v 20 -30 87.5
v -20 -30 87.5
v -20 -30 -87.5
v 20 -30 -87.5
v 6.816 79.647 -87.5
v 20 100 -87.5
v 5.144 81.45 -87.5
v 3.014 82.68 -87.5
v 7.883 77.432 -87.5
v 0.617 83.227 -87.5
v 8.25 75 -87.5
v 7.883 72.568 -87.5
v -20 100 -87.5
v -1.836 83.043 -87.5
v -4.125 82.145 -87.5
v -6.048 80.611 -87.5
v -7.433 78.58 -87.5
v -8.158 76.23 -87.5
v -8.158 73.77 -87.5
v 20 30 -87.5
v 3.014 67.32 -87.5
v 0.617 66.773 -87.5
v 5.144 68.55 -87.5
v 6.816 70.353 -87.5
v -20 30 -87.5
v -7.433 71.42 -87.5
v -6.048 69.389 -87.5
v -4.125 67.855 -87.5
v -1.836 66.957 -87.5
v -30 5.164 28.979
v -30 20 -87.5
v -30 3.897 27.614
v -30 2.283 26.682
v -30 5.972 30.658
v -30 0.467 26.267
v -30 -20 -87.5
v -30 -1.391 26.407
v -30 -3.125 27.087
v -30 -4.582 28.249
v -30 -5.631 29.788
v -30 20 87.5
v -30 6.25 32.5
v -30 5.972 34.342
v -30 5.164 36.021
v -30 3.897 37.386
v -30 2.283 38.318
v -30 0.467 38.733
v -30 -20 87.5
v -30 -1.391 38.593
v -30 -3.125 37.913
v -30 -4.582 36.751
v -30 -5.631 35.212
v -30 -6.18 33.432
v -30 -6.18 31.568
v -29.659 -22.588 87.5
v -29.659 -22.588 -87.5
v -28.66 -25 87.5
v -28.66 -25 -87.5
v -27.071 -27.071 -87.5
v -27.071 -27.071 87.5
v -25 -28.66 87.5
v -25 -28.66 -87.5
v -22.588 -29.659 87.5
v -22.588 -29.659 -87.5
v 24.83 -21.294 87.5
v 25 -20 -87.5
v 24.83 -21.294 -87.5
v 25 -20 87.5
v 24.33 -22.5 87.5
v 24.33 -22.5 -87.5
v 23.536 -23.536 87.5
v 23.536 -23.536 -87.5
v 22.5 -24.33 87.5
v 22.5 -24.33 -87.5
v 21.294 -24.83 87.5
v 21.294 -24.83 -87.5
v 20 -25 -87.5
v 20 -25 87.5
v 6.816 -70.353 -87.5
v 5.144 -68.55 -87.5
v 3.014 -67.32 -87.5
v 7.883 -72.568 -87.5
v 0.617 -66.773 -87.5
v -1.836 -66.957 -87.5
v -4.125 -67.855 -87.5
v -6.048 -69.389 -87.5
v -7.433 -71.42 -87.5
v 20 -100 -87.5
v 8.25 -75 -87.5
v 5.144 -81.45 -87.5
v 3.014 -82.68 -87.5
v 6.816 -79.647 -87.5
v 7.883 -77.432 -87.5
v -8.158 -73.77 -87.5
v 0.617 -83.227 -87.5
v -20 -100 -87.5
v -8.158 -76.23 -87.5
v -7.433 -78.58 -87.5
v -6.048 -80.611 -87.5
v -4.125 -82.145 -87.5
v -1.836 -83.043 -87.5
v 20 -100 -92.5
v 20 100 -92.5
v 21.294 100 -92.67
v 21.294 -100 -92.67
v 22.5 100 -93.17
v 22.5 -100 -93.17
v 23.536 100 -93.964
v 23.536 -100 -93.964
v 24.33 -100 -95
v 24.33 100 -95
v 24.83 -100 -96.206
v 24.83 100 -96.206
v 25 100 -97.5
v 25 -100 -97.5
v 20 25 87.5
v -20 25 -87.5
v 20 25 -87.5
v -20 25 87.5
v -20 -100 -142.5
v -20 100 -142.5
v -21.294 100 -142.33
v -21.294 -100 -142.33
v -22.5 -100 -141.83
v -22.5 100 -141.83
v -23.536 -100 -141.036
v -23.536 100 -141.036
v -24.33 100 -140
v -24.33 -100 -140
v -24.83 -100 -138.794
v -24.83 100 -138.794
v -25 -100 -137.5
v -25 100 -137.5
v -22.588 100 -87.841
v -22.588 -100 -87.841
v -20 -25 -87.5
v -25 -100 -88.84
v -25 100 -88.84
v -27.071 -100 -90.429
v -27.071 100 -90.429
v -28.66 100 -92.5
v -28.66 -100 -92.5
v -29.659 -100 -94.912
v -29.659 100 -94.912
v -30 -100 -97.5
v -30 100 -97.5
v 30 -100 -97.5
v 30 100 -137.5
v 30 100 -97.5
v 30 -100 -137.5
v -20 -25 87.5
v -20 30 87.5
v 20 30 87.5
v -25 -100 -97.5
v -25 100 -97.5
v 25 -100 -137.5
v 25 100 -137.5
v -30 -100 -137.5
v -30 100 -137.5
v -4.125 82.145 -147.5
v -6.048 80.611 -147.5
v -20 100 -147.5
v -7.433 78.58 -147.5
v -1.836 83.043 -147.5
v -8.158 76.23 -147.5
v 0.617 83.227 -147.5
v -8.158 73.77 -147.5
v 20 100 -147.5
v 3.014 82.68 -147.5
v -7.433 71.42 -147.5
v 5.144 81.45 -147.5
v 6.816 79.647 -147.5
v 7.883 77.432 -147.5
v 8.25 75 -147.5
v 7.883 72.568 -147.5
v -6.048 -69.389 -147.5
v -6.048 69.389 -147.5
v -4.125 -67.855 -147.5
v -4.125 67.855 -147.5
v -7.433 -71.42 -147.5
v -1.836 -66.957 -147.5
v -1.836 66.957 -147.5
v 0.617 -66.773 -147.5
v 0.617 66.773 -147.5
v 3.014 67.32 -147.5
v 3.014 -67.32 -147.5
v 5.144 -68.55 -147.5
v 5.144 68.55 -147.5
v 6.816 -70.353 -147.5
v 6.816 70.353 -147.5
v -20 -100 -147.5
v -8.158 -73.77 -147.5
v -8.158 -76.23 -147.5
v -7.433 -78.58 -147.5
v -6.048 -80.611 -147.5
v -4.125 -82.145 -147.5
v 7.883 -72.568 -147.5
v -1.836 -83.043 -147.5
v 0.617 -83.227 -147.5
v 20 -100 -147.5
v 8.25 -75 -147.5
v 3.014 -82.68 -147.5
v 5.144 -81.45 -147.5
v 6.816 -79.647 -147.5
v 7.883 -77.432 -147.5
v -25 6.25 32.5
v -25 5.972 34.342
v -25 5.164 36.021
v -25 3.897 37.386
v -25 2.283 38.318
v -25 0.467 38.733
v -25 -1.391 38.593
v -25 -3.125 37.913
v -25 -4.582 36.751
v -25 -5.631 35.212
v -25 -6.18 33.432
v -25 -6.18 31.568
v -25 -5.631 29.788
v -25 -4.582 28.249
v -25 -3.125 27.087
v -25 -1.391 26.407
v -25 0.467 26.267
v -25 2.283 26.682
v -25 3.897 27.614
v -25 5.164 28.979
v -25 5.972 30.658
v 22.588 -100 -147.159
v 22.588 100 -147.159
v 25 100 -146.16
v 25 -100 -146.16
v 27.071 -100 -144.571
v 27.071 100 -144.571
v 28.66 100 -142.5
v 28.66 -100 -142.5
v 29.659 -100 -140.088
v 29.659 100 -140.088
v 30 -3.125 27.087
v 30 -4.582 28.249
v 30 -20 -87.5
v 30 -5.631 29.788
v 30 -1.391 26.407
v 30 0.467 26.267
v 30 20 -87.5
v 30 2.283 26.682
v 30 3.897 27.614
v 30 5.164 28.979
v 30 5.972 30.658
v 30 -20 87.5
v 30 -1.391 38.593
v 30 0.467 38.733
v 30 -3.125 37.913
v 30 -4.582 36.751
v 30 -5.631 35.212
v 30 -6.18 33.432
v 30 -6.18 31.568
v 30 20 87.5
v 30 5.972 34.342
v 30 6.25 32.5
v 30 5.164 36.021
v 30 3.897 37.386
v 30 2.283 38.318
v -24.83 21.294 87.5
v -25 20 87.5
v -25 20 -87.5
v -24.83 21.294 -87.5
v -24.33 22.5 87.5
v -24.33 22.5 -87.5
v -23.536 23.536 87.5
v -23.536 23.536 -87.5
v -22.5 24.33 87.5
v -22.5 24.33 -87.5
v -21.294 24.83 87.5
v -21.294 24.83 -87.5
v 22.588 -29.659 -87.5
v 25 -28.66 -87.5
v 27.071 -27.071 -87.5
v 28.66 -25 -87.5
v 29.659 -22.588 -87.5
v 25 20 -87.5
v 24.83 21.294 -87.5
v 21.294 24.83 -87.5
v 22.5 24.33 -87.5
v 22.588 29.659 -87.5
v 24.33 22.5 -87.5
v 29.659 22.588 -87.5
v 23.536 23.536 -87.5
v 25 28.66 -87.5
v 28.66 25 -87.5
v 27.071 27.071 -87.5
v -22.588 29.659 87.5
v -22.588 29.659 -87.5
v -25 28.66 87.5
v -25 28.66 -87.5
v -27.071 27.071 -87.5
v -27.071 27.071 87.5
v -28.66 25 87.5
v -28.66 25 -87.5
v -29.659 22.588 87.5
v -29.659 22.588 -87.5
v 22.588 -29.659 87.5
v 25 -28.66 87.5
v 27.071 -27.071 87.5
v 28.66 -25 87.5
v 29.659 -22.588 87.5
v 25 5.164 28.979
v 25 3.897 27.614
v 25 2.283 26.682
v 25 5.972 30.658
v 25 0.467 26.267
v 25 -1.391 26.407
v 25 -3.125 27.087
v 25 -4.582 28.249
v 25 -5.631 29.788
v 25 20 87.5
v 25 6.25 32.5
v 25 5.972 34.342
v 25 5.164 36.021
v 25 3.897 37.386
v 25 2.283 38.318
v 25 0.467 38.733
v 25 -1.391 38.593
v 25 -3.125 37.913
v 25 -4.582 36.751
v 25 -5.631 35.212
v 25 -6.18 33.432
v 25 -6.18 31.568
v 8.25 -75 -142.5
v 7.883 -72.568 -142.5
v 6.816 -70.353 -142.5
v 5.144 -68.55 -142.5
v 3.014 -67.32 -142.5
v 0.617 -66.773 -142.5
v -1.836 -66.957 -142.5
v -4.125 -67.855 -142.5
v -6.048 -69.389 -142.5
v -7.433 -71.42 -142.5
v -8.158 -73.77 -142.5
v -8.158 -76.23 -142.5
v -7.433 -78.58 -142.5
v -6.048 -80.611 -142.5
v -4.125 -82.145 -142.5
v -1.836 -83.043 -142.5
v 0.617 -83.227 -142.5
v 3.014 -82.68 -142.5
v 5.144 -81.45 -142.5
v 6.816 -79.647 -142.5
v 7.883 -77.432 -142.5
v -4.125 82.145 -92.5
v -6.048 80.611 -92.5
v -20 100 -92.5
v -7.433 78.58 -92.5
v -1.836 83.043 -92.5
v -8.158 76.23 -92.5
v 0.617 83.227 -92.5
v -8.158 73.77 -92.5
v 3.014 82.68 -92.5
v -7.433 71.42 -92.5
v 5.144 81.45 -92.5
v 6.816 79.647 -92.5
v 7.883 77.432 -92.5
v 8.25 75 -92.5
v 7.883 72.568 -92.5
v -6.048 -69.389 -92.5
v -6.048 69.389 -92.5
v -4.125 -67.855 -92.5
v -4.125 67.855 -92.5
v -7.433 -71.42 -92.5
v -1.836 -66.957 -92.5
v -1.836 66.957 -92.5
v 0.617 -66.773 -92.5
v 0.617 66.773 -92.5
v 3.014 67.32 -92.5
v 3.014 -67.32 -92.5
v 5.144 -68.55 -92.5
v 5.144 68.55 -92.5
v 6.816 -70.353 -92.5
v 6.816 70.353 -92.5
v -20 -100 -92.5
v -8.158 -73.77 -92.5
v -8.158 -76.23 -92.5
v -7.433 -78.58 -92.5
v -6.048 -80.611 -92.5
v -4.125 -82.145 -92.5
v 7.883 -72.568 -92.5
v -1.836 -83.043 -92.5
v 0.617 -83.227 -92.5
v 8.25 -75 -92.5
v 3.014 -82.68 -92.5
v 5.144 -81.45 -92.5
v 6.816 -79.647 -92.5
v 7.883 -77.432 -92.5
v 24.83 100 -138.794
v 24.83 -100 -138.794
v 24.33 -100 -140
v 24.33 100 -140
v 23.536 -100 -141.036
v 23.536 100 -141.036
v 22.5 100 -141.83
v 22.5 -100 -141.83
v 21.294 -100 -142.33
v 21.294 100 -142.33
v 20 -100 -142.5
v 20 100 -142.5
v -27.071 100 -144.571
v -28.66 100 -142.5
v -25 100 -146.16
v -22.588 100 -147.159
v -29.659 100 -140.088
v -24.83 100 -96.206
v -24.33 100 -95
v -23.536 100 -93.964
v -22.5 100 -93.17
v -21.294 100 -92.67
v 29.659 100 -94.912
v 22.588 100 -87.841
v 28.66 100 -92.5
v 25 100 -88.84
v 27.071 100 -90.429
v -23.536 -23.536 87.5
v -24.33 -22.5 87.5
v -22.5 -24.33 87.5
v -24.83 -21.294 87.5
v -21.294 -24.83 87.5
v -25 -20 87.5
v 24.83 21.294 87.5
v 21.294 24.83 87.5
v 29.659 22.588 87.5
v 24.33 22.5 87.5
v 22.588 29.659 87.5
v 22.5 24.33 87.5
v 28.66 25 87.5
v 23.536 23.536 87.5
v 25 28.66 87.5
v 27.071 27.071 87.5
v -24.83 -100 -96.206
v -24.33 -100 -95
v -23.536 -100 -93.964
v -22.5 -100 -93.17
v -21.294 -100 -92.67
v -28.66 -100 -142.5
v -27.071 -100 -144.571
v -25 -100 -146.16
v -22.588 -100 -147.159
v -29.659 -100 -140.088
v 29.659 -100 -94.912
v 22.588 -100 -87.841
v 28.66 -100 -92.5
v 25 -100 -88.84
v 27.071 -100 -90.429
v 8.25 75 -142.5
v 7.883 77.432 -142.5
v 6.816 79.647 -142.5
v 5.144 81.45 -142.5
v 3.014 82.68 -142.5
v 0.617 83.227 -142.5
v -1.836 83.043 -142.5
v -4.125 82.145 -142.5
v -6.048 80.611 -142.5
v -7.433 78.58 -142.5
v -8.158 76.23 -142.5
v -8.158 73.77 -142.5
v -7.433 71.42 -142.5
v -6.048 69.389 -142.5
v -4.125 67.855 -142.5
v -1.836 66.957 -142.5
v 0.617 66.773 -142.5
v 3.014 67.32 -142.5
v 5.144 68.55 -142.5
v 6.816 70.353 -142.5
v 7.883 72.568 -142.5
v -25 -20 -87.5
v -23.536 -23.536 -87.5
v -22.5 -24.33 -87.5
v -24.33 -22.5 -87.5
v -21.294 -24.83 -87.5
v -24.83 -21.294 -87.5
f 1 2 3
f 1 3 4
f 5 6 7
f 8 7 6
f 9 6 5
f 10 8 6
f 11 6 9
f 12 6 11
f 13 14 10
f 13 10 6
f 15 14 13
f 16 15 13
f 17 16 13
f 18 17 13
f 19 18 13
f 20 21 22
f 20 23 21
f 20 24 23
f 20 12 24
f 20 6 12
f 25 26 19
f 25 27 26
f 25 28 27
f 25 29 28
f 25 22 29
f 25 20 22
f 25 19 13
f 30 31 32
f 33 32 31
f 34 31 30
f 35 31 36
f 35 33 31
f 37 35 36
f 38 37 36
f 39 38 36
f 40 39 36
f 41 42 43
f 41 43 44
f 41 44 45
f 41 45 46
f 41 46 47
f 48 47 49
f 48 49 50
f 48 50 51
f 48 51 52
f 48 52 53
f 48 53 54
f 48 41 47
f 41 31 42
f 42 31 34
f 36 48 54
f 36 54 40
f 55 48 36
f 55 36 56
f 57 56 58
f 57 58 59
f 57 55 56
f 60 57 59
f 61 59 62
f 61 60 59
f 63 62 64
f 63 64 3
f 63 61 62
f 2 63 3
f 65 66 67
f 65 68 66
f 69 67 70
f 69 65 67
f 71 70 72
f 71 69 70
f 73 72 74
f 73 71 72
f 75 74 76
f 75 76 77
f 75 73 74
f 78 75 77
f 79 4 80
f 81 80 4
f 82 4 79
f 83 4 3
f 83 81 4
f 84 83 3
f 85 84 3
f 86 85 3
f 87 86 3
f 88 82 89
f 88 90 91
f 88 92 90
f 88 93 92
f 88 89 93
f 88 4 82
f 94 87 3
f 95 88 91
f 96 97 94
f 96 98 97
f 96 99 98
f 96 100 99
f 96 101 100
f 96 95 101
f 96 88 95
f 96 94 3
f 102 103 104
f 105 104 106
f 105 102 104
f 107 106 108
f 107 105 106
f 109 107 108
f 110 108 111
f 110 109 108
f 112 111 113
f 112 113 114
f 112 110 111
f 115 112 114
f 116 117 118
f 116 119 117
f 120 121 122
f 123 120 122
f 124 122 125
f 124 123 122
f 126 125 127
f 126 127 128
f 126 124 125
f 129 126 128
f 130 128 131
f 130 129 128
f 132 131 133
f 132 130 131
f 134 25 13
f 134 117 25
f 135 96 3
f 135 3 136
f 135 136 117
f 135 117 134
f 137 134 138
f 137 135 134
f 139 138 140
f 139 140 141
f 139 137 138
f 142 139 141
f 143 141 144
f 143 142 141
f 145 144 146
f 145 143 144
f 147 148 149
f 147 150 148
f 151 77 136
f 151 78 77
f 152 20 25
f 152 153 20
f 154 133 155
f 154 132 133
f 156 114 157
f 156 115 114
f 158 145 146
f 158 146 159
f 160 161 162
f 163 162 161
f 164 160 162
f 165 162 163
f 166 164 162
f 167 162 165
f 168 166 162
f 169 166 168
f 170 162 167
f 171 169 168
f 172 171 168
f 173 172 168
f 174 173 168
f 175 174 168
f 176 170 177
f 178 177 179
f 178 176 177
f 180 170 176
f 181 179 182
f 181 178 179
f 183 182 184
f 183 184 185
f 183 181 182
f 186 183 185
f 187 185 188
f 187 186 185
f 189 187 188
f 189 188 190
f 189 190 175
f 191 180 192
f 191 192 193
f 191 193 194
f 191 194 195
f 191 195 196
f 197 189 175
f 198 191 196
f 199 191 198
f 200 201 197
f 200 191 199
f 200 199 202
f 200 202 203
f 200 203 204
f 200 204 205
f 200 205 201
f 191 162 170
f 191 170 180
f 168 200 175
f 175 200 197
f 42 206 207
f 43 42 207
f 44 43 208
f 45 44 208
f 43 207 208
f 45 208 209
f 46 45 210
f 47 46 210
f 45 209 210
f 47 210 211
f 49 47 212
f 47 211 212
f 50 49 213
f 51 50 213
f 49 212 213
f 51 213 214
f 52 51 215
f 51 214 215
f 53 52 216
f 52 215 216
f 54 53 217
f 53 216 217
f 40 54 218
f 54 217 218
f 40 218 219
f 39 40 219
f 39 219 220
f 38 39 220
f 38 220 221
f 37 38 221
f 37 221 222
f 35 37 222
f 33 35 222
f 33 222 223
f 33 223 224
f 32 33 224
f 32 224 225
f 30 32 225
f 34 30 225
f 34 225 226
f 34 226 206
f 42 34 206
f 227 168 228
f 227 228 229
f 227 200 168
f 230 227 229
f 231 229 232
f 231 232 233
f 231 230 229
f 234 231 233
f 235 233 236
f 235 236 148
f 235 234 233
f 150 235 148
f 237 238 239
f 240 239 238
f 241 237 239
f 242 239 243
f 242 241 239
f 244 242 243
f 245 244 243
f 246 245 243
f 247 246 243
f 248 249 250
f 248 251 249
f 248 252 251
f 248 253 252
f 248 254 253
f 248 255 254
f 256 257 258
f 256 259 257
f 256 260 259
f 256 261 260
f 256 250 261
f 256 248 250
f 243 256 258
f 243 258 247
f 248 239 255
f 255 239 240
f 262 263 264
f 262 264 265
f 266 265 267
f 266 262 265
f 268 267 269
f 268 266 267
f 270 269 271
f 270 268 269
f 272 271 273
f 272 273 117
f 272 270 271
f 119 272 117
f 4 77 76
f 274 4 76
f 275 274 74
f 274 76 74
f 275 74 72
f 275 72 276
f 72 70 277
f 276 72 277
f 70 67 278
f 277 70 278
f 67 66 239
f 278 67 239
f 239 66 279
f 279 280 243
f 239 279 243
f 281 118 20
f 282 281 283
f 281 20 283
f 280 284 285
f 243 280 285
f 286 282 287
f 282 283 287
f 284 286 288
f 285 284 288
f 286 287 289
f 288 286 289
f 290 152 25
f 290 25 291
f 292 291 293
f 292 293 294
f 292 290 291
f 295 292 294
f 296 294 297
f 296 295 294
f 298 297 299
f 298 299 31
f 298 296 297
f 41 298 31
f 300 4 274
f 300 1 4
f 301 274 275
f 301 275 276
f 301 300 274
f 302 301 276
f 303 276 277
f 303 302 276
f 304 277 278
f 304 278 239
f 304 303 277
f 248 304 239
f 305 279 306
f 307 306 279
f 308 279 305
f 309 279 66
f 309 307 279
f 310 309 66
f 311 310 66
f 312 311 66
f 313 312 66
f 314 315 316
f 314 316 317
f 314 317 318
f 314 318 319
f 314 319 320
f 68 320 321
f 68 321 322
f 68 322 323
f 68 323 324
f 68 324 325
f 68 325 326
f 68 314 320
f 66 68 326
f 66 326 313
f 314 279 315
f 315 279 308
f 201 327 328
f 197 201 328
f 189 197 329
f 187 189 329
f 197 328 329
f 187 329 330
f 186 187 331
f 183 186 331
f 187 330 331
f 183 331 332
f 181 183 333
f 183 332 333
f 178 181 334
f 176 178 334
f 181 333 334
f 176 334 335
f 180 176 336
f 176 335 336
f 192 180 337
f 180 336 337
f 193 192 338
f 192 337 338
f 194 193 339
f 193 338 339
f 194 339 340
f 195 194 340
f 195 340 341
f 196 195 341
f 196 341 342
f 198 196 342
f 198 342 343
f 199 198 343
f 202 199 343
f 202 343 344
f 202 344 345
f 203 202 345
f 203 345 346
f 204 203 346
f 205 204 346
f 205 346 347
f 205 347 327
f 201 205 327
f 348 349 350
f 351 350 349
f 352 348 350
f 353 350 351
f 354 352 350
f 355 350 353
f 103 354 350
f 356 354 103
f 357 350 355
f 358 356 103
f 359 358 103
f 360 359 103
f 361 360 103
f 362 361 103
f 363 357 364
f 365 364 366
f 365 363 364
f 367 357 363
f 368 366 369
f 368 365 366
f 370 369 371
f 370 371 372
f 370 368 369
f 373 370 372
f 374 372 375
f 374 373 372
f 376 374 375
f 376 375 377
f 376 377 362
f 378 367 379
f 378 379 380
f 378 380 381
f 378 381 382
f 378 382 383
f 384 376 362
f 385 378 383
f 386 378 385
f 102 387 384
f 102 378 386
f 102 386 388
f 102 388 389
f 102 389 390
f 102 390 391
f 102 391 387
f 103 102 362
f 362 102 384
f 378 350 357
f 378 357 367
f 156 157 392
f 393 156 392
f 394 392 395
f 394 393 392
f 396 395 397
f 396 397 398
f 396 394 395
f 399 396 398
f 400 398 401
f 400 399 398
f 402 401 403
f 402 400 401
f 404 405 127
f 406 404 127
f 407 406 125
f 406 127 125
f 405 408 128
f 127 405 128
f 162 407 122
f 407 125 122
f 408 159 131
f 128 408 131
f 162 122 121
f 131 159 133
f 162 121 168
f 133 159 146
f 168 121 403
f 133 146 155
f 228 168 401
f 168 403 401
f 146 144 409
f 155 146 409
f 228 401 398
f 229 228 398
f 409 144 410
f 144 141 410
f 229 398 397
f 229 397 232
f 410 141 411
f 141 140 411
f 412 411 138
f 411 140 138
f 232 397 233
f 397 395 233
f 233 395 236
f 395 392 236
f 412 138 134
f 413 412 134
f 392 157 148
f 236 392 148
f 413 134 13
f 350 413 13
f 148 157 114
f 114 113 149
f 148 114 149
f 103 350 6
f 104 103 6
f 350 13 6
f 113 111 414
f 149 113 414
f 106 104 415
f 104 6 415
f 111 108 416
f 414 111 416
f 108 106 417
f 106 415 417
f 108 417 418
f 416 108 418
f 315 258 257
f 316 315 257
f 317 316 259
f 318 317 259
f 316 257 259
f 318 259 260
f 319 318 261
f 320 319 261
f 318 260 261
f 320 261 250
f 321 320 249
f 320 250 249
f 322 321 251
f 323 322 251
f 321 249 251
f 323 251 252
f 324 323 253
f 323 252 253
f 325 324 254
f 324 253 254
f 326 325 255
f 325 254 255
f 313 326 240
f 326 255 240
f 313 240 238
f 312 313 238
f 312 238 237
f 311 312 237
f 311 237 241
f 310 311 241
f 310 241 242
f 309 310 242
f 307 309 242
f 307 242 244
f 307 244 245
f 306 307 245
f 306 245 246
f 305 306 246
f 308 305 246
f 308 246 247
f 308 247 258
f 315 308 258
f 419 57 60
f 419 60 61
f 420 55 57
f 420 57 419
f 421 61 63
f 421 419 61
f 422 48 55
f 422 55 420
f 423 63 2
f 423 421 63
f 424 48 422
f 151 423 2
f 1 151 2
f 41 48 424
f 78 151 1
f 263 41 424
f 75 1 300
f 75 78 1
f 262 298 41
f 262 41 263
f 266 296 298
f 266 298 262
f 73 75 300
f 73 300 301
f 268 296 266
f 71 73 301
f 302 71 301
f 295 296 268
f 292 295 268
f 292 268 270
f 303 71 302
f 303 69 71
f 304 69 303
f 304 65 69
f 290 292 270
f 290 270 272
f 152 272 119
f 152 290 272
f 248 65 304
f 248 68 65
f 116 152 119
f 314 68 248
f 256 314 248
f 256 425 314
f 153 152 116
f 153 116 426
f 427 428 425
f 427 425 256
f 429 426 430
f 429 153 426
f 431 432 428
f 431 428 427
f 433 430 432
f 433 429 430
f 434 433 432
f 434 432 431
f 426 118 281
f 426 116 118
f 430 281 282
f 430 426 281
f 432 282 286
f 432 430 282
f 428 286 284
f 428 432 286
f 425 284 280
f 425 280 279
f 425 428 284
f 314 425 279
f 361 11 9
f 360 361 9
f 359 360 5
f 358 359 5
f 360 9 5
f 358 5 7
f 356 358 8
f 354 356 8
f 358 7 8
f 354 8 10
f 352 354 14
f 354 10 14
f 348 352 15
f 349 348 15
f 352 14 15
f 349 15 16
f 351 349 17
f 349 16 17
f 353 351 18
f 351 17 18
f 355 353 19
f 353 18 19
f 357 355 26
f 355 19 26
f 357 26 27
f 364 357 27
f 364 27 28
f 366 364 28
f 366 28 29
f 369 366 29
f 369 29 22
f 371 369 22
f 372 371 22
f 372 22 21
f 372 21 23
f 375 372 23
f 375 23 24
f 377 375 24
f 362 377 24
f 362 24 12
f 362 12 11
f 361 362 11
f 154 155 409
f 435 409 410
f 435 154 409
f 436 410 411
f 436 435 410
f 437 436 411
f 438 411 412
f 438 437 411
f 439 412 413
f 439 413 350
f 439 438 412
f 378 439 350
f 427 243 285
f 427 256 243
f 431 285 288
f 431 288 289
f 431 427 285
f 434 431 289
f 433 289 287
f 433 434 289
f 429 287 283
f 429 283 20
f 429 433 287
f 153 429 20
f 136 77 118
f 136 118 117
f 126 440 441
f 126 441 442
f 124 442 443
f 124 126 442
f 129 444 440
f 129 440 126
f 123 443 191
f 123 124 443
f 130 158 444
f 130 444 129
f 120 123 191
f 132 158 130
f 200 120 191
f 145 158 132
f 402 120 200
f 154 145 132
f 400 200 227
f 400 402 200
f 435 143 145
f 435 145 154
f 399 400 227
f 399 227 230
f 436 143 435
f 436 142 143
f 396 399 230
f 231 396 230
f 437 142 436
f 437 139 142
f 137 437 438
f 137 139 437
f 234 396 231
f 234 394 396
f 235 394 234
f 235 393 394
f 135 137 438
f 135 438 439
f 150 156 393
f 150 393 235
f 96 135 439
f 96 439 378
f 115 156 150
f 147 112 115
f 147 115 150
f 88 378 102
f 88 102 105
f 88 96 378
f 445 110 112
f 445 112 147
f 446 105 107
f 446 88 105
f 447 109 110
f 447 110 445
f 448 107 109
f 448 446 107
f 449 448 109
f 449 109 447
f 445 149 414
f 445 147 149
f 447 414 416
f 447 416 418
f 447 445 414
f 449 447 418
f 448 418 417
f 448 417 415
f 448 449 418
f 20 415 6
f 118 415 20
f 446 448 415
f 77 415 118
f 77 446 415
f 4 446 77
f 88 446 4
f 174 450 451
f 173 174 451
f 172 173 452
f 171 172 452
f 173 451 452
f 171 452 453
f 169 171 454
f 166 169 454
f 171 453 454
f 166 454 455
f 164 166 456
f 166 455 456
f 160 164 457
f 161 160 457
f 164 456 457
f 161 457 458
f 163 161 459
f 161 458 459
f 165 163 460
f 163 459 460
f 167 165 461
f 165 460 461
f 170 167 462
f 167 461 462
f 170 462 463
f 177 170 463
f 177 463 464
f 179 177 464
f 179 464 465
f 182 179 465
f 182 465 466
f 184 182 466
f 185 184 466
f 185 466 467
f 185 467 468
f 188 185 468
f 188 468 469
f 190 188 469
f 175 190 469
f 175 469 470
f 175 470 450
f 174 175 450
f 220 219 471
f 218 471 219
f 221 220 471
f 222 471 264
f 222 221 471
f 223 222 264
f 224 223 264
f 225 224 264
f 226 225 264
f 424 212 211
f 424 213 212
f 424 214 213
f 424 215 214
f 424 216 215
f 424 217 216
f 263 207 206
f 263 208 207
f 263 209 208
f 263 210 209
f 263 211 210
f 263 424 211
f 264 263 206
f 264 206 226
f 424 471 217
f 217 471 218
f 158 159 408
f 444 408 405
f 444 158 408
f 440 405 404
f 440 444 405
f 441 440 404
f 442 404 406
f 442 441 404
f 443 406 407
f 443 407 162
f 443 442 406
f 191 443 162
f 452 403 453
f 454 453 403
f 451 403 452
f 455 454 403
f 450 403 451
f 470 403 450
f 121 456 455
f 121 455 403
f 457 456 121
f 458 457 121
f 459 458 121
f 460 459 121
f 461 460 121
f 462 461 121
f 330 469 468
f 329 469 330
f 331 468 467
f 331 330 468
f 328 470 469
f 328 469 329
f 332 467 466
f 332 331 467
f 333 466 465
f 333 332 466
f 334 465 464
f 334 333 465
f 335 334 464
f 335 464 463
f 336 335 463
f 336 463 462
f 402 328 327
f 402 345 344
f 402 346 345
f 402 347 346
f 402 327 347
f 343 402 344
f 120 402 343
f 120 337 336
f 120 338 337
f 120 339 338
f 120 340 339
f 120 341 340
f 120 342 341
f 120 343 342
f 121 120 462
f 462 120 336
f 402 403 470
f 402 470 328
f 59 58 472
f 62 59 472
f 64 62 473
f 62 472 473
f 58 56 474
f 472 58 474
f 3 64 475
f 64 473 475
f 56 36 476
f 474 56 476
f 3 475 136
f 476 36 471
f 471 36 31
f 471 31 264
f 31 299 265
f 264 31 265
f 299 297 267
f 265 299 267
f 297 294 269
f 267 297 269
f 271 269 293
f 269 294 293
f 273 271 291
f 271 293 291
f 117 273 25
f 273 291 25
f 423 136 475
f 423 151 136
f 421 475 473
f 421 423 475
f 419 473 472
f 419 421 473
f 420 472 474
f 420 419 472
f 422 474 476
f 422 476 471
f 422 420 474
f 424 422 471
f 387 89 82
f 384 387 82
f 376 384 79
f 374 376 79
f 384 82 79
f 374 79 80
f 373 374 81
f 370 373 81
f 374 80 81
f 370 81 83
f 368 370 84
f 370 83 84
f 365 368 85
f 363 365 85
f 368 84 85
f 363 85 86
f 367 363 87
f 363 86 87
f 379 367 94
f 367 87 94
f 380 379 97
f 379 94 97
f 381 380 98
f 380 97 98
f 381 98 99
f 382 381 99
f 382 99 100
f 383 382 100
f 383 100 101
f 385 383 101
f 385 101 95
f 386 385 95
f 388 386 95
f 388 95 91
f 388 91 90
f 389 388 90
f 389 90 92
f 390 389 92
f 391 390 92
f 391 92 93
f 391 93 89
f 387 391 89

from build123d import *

# Parameters (mm, degrees)
F1_DEPTH = 87.5
F3_DEPTH = 100
F4_R     = 8.25
F5_DEPTH = 60.001
F6_R     = 6.25
F7_DEPTH = 60.001


with BuildPart() as f1:
    # F0 (on Top) → F1 (new body, symmetric)
    with BuildSketch(Plane.XY):
        with BuildLine():
            Line((20, 30), (-20, 30))
            ThreePointArc((-20, 30), (-27.071068, 27.071068), (-30, 20))
            Line((-30, 20), (-30, -20))
            ThreePointArc((-30, -20), (-27.071068, -27.071068), (-20, -30))
            Line((-20, -30), (20, -30))
            ThreePointArc((20, -30), (27.071068, -27.071068), (30, -20))
            Line((30, -20), (30, 20))
            ThreePointArc((30, 20), (27.071068, 27.071068), (20, 30))
        make_face()
        with BuildLine():
            ThreePointArc((-25, 20), (-23.535534, 23.535534), (-20, 25))
            Line((-20, 25), (20, 25))
            ThreePointArc((20, 25), (23.535534, 23.535534), (25, 20))
            Line((25, 20), (25, -20))
            ThreePointArc((25, -20), (23.535534, -23.535534), (20, -25))
            Line((20, -25), (-20, -25))
            ThreePointArc((-20, -25), (-23.535534, -23.535534), (-25, -20))
            Line((-25, -20), (-25, 20))
        make_face(mode=Mode.SUBTRACT)
    extrude(amount=F1_DEPTH, both=True)

    # F2 (on Front) → F3 (join, symmetric)
    with BuildSketch(Plane.XZ):
        with BuildLine():
            Line((20, -87.5), (-20, -87.5))
            ThreePointArc((-20, -87.5), (-27.071068, -90.428932), (-30, -97.5))
            Line((-30, -97.5), (-30, -137.5))
            ThreePointArc((-30, -137.5), (-27.071068, -144.571068), (-20, -147.5))
            Line((-20, -147.5), (20, -147.5))
            ThreePointArc((20, -147.5), (27.071068, -144.571068), (30, -137.5))
            Line((30, -137.5), (30, -97.5))
            ThreePointArc((30, -97.5), (27.071068, -90.428932), (20, -87.5))
        make_face()
        with BuildLine():
            ThreePointArc((20, -92.5), (23.535534, -93.964466), (25, -97.5))
            Line((25, -97.5), (25, -137.5))
            ThreePointArc((25, -137.5), (23.535534, -141.035534), (20, -142.5))
            Line((20, -142.5), (-20, -142.5))
            ThreePointArc((-20, -142.5), (-23.535534, -141.035534), (-25, -137.5))
            Line((-25, -137.5), (-25, -97.5))
            ThreePointArc((-25, -97.5), (-23.535534, -93.964466), (-20, -92.5))
            Line((-20, -92.5), (20, -92.5))
        make_face(mode=Mode.SUBTRACT)
    extrude(amount=F3_DEPTH, both=True)

    # F4 (on face) → F5 (cut, through all)
    with BuildSketch(Plane.XY.offset(-87.5)):
        with Locations((0, 75)):
            Circle(F4_R)
        with Locations((0, -75)):
            Circle(F4_R)
    extrude(amount=-F5_DEPTH, mode=Mode.SUBTRACT)

    # F6 (on face) → F7 (cut, through all)
    with BuildSketch(Plane.YZ.offset(30)):
        with Locations((0, 32.5)):
            Circle(F6_R)
    extrude(amount=-F7_DEPTH, mode=Mode.SUBTRACT)


solid = f1.part
